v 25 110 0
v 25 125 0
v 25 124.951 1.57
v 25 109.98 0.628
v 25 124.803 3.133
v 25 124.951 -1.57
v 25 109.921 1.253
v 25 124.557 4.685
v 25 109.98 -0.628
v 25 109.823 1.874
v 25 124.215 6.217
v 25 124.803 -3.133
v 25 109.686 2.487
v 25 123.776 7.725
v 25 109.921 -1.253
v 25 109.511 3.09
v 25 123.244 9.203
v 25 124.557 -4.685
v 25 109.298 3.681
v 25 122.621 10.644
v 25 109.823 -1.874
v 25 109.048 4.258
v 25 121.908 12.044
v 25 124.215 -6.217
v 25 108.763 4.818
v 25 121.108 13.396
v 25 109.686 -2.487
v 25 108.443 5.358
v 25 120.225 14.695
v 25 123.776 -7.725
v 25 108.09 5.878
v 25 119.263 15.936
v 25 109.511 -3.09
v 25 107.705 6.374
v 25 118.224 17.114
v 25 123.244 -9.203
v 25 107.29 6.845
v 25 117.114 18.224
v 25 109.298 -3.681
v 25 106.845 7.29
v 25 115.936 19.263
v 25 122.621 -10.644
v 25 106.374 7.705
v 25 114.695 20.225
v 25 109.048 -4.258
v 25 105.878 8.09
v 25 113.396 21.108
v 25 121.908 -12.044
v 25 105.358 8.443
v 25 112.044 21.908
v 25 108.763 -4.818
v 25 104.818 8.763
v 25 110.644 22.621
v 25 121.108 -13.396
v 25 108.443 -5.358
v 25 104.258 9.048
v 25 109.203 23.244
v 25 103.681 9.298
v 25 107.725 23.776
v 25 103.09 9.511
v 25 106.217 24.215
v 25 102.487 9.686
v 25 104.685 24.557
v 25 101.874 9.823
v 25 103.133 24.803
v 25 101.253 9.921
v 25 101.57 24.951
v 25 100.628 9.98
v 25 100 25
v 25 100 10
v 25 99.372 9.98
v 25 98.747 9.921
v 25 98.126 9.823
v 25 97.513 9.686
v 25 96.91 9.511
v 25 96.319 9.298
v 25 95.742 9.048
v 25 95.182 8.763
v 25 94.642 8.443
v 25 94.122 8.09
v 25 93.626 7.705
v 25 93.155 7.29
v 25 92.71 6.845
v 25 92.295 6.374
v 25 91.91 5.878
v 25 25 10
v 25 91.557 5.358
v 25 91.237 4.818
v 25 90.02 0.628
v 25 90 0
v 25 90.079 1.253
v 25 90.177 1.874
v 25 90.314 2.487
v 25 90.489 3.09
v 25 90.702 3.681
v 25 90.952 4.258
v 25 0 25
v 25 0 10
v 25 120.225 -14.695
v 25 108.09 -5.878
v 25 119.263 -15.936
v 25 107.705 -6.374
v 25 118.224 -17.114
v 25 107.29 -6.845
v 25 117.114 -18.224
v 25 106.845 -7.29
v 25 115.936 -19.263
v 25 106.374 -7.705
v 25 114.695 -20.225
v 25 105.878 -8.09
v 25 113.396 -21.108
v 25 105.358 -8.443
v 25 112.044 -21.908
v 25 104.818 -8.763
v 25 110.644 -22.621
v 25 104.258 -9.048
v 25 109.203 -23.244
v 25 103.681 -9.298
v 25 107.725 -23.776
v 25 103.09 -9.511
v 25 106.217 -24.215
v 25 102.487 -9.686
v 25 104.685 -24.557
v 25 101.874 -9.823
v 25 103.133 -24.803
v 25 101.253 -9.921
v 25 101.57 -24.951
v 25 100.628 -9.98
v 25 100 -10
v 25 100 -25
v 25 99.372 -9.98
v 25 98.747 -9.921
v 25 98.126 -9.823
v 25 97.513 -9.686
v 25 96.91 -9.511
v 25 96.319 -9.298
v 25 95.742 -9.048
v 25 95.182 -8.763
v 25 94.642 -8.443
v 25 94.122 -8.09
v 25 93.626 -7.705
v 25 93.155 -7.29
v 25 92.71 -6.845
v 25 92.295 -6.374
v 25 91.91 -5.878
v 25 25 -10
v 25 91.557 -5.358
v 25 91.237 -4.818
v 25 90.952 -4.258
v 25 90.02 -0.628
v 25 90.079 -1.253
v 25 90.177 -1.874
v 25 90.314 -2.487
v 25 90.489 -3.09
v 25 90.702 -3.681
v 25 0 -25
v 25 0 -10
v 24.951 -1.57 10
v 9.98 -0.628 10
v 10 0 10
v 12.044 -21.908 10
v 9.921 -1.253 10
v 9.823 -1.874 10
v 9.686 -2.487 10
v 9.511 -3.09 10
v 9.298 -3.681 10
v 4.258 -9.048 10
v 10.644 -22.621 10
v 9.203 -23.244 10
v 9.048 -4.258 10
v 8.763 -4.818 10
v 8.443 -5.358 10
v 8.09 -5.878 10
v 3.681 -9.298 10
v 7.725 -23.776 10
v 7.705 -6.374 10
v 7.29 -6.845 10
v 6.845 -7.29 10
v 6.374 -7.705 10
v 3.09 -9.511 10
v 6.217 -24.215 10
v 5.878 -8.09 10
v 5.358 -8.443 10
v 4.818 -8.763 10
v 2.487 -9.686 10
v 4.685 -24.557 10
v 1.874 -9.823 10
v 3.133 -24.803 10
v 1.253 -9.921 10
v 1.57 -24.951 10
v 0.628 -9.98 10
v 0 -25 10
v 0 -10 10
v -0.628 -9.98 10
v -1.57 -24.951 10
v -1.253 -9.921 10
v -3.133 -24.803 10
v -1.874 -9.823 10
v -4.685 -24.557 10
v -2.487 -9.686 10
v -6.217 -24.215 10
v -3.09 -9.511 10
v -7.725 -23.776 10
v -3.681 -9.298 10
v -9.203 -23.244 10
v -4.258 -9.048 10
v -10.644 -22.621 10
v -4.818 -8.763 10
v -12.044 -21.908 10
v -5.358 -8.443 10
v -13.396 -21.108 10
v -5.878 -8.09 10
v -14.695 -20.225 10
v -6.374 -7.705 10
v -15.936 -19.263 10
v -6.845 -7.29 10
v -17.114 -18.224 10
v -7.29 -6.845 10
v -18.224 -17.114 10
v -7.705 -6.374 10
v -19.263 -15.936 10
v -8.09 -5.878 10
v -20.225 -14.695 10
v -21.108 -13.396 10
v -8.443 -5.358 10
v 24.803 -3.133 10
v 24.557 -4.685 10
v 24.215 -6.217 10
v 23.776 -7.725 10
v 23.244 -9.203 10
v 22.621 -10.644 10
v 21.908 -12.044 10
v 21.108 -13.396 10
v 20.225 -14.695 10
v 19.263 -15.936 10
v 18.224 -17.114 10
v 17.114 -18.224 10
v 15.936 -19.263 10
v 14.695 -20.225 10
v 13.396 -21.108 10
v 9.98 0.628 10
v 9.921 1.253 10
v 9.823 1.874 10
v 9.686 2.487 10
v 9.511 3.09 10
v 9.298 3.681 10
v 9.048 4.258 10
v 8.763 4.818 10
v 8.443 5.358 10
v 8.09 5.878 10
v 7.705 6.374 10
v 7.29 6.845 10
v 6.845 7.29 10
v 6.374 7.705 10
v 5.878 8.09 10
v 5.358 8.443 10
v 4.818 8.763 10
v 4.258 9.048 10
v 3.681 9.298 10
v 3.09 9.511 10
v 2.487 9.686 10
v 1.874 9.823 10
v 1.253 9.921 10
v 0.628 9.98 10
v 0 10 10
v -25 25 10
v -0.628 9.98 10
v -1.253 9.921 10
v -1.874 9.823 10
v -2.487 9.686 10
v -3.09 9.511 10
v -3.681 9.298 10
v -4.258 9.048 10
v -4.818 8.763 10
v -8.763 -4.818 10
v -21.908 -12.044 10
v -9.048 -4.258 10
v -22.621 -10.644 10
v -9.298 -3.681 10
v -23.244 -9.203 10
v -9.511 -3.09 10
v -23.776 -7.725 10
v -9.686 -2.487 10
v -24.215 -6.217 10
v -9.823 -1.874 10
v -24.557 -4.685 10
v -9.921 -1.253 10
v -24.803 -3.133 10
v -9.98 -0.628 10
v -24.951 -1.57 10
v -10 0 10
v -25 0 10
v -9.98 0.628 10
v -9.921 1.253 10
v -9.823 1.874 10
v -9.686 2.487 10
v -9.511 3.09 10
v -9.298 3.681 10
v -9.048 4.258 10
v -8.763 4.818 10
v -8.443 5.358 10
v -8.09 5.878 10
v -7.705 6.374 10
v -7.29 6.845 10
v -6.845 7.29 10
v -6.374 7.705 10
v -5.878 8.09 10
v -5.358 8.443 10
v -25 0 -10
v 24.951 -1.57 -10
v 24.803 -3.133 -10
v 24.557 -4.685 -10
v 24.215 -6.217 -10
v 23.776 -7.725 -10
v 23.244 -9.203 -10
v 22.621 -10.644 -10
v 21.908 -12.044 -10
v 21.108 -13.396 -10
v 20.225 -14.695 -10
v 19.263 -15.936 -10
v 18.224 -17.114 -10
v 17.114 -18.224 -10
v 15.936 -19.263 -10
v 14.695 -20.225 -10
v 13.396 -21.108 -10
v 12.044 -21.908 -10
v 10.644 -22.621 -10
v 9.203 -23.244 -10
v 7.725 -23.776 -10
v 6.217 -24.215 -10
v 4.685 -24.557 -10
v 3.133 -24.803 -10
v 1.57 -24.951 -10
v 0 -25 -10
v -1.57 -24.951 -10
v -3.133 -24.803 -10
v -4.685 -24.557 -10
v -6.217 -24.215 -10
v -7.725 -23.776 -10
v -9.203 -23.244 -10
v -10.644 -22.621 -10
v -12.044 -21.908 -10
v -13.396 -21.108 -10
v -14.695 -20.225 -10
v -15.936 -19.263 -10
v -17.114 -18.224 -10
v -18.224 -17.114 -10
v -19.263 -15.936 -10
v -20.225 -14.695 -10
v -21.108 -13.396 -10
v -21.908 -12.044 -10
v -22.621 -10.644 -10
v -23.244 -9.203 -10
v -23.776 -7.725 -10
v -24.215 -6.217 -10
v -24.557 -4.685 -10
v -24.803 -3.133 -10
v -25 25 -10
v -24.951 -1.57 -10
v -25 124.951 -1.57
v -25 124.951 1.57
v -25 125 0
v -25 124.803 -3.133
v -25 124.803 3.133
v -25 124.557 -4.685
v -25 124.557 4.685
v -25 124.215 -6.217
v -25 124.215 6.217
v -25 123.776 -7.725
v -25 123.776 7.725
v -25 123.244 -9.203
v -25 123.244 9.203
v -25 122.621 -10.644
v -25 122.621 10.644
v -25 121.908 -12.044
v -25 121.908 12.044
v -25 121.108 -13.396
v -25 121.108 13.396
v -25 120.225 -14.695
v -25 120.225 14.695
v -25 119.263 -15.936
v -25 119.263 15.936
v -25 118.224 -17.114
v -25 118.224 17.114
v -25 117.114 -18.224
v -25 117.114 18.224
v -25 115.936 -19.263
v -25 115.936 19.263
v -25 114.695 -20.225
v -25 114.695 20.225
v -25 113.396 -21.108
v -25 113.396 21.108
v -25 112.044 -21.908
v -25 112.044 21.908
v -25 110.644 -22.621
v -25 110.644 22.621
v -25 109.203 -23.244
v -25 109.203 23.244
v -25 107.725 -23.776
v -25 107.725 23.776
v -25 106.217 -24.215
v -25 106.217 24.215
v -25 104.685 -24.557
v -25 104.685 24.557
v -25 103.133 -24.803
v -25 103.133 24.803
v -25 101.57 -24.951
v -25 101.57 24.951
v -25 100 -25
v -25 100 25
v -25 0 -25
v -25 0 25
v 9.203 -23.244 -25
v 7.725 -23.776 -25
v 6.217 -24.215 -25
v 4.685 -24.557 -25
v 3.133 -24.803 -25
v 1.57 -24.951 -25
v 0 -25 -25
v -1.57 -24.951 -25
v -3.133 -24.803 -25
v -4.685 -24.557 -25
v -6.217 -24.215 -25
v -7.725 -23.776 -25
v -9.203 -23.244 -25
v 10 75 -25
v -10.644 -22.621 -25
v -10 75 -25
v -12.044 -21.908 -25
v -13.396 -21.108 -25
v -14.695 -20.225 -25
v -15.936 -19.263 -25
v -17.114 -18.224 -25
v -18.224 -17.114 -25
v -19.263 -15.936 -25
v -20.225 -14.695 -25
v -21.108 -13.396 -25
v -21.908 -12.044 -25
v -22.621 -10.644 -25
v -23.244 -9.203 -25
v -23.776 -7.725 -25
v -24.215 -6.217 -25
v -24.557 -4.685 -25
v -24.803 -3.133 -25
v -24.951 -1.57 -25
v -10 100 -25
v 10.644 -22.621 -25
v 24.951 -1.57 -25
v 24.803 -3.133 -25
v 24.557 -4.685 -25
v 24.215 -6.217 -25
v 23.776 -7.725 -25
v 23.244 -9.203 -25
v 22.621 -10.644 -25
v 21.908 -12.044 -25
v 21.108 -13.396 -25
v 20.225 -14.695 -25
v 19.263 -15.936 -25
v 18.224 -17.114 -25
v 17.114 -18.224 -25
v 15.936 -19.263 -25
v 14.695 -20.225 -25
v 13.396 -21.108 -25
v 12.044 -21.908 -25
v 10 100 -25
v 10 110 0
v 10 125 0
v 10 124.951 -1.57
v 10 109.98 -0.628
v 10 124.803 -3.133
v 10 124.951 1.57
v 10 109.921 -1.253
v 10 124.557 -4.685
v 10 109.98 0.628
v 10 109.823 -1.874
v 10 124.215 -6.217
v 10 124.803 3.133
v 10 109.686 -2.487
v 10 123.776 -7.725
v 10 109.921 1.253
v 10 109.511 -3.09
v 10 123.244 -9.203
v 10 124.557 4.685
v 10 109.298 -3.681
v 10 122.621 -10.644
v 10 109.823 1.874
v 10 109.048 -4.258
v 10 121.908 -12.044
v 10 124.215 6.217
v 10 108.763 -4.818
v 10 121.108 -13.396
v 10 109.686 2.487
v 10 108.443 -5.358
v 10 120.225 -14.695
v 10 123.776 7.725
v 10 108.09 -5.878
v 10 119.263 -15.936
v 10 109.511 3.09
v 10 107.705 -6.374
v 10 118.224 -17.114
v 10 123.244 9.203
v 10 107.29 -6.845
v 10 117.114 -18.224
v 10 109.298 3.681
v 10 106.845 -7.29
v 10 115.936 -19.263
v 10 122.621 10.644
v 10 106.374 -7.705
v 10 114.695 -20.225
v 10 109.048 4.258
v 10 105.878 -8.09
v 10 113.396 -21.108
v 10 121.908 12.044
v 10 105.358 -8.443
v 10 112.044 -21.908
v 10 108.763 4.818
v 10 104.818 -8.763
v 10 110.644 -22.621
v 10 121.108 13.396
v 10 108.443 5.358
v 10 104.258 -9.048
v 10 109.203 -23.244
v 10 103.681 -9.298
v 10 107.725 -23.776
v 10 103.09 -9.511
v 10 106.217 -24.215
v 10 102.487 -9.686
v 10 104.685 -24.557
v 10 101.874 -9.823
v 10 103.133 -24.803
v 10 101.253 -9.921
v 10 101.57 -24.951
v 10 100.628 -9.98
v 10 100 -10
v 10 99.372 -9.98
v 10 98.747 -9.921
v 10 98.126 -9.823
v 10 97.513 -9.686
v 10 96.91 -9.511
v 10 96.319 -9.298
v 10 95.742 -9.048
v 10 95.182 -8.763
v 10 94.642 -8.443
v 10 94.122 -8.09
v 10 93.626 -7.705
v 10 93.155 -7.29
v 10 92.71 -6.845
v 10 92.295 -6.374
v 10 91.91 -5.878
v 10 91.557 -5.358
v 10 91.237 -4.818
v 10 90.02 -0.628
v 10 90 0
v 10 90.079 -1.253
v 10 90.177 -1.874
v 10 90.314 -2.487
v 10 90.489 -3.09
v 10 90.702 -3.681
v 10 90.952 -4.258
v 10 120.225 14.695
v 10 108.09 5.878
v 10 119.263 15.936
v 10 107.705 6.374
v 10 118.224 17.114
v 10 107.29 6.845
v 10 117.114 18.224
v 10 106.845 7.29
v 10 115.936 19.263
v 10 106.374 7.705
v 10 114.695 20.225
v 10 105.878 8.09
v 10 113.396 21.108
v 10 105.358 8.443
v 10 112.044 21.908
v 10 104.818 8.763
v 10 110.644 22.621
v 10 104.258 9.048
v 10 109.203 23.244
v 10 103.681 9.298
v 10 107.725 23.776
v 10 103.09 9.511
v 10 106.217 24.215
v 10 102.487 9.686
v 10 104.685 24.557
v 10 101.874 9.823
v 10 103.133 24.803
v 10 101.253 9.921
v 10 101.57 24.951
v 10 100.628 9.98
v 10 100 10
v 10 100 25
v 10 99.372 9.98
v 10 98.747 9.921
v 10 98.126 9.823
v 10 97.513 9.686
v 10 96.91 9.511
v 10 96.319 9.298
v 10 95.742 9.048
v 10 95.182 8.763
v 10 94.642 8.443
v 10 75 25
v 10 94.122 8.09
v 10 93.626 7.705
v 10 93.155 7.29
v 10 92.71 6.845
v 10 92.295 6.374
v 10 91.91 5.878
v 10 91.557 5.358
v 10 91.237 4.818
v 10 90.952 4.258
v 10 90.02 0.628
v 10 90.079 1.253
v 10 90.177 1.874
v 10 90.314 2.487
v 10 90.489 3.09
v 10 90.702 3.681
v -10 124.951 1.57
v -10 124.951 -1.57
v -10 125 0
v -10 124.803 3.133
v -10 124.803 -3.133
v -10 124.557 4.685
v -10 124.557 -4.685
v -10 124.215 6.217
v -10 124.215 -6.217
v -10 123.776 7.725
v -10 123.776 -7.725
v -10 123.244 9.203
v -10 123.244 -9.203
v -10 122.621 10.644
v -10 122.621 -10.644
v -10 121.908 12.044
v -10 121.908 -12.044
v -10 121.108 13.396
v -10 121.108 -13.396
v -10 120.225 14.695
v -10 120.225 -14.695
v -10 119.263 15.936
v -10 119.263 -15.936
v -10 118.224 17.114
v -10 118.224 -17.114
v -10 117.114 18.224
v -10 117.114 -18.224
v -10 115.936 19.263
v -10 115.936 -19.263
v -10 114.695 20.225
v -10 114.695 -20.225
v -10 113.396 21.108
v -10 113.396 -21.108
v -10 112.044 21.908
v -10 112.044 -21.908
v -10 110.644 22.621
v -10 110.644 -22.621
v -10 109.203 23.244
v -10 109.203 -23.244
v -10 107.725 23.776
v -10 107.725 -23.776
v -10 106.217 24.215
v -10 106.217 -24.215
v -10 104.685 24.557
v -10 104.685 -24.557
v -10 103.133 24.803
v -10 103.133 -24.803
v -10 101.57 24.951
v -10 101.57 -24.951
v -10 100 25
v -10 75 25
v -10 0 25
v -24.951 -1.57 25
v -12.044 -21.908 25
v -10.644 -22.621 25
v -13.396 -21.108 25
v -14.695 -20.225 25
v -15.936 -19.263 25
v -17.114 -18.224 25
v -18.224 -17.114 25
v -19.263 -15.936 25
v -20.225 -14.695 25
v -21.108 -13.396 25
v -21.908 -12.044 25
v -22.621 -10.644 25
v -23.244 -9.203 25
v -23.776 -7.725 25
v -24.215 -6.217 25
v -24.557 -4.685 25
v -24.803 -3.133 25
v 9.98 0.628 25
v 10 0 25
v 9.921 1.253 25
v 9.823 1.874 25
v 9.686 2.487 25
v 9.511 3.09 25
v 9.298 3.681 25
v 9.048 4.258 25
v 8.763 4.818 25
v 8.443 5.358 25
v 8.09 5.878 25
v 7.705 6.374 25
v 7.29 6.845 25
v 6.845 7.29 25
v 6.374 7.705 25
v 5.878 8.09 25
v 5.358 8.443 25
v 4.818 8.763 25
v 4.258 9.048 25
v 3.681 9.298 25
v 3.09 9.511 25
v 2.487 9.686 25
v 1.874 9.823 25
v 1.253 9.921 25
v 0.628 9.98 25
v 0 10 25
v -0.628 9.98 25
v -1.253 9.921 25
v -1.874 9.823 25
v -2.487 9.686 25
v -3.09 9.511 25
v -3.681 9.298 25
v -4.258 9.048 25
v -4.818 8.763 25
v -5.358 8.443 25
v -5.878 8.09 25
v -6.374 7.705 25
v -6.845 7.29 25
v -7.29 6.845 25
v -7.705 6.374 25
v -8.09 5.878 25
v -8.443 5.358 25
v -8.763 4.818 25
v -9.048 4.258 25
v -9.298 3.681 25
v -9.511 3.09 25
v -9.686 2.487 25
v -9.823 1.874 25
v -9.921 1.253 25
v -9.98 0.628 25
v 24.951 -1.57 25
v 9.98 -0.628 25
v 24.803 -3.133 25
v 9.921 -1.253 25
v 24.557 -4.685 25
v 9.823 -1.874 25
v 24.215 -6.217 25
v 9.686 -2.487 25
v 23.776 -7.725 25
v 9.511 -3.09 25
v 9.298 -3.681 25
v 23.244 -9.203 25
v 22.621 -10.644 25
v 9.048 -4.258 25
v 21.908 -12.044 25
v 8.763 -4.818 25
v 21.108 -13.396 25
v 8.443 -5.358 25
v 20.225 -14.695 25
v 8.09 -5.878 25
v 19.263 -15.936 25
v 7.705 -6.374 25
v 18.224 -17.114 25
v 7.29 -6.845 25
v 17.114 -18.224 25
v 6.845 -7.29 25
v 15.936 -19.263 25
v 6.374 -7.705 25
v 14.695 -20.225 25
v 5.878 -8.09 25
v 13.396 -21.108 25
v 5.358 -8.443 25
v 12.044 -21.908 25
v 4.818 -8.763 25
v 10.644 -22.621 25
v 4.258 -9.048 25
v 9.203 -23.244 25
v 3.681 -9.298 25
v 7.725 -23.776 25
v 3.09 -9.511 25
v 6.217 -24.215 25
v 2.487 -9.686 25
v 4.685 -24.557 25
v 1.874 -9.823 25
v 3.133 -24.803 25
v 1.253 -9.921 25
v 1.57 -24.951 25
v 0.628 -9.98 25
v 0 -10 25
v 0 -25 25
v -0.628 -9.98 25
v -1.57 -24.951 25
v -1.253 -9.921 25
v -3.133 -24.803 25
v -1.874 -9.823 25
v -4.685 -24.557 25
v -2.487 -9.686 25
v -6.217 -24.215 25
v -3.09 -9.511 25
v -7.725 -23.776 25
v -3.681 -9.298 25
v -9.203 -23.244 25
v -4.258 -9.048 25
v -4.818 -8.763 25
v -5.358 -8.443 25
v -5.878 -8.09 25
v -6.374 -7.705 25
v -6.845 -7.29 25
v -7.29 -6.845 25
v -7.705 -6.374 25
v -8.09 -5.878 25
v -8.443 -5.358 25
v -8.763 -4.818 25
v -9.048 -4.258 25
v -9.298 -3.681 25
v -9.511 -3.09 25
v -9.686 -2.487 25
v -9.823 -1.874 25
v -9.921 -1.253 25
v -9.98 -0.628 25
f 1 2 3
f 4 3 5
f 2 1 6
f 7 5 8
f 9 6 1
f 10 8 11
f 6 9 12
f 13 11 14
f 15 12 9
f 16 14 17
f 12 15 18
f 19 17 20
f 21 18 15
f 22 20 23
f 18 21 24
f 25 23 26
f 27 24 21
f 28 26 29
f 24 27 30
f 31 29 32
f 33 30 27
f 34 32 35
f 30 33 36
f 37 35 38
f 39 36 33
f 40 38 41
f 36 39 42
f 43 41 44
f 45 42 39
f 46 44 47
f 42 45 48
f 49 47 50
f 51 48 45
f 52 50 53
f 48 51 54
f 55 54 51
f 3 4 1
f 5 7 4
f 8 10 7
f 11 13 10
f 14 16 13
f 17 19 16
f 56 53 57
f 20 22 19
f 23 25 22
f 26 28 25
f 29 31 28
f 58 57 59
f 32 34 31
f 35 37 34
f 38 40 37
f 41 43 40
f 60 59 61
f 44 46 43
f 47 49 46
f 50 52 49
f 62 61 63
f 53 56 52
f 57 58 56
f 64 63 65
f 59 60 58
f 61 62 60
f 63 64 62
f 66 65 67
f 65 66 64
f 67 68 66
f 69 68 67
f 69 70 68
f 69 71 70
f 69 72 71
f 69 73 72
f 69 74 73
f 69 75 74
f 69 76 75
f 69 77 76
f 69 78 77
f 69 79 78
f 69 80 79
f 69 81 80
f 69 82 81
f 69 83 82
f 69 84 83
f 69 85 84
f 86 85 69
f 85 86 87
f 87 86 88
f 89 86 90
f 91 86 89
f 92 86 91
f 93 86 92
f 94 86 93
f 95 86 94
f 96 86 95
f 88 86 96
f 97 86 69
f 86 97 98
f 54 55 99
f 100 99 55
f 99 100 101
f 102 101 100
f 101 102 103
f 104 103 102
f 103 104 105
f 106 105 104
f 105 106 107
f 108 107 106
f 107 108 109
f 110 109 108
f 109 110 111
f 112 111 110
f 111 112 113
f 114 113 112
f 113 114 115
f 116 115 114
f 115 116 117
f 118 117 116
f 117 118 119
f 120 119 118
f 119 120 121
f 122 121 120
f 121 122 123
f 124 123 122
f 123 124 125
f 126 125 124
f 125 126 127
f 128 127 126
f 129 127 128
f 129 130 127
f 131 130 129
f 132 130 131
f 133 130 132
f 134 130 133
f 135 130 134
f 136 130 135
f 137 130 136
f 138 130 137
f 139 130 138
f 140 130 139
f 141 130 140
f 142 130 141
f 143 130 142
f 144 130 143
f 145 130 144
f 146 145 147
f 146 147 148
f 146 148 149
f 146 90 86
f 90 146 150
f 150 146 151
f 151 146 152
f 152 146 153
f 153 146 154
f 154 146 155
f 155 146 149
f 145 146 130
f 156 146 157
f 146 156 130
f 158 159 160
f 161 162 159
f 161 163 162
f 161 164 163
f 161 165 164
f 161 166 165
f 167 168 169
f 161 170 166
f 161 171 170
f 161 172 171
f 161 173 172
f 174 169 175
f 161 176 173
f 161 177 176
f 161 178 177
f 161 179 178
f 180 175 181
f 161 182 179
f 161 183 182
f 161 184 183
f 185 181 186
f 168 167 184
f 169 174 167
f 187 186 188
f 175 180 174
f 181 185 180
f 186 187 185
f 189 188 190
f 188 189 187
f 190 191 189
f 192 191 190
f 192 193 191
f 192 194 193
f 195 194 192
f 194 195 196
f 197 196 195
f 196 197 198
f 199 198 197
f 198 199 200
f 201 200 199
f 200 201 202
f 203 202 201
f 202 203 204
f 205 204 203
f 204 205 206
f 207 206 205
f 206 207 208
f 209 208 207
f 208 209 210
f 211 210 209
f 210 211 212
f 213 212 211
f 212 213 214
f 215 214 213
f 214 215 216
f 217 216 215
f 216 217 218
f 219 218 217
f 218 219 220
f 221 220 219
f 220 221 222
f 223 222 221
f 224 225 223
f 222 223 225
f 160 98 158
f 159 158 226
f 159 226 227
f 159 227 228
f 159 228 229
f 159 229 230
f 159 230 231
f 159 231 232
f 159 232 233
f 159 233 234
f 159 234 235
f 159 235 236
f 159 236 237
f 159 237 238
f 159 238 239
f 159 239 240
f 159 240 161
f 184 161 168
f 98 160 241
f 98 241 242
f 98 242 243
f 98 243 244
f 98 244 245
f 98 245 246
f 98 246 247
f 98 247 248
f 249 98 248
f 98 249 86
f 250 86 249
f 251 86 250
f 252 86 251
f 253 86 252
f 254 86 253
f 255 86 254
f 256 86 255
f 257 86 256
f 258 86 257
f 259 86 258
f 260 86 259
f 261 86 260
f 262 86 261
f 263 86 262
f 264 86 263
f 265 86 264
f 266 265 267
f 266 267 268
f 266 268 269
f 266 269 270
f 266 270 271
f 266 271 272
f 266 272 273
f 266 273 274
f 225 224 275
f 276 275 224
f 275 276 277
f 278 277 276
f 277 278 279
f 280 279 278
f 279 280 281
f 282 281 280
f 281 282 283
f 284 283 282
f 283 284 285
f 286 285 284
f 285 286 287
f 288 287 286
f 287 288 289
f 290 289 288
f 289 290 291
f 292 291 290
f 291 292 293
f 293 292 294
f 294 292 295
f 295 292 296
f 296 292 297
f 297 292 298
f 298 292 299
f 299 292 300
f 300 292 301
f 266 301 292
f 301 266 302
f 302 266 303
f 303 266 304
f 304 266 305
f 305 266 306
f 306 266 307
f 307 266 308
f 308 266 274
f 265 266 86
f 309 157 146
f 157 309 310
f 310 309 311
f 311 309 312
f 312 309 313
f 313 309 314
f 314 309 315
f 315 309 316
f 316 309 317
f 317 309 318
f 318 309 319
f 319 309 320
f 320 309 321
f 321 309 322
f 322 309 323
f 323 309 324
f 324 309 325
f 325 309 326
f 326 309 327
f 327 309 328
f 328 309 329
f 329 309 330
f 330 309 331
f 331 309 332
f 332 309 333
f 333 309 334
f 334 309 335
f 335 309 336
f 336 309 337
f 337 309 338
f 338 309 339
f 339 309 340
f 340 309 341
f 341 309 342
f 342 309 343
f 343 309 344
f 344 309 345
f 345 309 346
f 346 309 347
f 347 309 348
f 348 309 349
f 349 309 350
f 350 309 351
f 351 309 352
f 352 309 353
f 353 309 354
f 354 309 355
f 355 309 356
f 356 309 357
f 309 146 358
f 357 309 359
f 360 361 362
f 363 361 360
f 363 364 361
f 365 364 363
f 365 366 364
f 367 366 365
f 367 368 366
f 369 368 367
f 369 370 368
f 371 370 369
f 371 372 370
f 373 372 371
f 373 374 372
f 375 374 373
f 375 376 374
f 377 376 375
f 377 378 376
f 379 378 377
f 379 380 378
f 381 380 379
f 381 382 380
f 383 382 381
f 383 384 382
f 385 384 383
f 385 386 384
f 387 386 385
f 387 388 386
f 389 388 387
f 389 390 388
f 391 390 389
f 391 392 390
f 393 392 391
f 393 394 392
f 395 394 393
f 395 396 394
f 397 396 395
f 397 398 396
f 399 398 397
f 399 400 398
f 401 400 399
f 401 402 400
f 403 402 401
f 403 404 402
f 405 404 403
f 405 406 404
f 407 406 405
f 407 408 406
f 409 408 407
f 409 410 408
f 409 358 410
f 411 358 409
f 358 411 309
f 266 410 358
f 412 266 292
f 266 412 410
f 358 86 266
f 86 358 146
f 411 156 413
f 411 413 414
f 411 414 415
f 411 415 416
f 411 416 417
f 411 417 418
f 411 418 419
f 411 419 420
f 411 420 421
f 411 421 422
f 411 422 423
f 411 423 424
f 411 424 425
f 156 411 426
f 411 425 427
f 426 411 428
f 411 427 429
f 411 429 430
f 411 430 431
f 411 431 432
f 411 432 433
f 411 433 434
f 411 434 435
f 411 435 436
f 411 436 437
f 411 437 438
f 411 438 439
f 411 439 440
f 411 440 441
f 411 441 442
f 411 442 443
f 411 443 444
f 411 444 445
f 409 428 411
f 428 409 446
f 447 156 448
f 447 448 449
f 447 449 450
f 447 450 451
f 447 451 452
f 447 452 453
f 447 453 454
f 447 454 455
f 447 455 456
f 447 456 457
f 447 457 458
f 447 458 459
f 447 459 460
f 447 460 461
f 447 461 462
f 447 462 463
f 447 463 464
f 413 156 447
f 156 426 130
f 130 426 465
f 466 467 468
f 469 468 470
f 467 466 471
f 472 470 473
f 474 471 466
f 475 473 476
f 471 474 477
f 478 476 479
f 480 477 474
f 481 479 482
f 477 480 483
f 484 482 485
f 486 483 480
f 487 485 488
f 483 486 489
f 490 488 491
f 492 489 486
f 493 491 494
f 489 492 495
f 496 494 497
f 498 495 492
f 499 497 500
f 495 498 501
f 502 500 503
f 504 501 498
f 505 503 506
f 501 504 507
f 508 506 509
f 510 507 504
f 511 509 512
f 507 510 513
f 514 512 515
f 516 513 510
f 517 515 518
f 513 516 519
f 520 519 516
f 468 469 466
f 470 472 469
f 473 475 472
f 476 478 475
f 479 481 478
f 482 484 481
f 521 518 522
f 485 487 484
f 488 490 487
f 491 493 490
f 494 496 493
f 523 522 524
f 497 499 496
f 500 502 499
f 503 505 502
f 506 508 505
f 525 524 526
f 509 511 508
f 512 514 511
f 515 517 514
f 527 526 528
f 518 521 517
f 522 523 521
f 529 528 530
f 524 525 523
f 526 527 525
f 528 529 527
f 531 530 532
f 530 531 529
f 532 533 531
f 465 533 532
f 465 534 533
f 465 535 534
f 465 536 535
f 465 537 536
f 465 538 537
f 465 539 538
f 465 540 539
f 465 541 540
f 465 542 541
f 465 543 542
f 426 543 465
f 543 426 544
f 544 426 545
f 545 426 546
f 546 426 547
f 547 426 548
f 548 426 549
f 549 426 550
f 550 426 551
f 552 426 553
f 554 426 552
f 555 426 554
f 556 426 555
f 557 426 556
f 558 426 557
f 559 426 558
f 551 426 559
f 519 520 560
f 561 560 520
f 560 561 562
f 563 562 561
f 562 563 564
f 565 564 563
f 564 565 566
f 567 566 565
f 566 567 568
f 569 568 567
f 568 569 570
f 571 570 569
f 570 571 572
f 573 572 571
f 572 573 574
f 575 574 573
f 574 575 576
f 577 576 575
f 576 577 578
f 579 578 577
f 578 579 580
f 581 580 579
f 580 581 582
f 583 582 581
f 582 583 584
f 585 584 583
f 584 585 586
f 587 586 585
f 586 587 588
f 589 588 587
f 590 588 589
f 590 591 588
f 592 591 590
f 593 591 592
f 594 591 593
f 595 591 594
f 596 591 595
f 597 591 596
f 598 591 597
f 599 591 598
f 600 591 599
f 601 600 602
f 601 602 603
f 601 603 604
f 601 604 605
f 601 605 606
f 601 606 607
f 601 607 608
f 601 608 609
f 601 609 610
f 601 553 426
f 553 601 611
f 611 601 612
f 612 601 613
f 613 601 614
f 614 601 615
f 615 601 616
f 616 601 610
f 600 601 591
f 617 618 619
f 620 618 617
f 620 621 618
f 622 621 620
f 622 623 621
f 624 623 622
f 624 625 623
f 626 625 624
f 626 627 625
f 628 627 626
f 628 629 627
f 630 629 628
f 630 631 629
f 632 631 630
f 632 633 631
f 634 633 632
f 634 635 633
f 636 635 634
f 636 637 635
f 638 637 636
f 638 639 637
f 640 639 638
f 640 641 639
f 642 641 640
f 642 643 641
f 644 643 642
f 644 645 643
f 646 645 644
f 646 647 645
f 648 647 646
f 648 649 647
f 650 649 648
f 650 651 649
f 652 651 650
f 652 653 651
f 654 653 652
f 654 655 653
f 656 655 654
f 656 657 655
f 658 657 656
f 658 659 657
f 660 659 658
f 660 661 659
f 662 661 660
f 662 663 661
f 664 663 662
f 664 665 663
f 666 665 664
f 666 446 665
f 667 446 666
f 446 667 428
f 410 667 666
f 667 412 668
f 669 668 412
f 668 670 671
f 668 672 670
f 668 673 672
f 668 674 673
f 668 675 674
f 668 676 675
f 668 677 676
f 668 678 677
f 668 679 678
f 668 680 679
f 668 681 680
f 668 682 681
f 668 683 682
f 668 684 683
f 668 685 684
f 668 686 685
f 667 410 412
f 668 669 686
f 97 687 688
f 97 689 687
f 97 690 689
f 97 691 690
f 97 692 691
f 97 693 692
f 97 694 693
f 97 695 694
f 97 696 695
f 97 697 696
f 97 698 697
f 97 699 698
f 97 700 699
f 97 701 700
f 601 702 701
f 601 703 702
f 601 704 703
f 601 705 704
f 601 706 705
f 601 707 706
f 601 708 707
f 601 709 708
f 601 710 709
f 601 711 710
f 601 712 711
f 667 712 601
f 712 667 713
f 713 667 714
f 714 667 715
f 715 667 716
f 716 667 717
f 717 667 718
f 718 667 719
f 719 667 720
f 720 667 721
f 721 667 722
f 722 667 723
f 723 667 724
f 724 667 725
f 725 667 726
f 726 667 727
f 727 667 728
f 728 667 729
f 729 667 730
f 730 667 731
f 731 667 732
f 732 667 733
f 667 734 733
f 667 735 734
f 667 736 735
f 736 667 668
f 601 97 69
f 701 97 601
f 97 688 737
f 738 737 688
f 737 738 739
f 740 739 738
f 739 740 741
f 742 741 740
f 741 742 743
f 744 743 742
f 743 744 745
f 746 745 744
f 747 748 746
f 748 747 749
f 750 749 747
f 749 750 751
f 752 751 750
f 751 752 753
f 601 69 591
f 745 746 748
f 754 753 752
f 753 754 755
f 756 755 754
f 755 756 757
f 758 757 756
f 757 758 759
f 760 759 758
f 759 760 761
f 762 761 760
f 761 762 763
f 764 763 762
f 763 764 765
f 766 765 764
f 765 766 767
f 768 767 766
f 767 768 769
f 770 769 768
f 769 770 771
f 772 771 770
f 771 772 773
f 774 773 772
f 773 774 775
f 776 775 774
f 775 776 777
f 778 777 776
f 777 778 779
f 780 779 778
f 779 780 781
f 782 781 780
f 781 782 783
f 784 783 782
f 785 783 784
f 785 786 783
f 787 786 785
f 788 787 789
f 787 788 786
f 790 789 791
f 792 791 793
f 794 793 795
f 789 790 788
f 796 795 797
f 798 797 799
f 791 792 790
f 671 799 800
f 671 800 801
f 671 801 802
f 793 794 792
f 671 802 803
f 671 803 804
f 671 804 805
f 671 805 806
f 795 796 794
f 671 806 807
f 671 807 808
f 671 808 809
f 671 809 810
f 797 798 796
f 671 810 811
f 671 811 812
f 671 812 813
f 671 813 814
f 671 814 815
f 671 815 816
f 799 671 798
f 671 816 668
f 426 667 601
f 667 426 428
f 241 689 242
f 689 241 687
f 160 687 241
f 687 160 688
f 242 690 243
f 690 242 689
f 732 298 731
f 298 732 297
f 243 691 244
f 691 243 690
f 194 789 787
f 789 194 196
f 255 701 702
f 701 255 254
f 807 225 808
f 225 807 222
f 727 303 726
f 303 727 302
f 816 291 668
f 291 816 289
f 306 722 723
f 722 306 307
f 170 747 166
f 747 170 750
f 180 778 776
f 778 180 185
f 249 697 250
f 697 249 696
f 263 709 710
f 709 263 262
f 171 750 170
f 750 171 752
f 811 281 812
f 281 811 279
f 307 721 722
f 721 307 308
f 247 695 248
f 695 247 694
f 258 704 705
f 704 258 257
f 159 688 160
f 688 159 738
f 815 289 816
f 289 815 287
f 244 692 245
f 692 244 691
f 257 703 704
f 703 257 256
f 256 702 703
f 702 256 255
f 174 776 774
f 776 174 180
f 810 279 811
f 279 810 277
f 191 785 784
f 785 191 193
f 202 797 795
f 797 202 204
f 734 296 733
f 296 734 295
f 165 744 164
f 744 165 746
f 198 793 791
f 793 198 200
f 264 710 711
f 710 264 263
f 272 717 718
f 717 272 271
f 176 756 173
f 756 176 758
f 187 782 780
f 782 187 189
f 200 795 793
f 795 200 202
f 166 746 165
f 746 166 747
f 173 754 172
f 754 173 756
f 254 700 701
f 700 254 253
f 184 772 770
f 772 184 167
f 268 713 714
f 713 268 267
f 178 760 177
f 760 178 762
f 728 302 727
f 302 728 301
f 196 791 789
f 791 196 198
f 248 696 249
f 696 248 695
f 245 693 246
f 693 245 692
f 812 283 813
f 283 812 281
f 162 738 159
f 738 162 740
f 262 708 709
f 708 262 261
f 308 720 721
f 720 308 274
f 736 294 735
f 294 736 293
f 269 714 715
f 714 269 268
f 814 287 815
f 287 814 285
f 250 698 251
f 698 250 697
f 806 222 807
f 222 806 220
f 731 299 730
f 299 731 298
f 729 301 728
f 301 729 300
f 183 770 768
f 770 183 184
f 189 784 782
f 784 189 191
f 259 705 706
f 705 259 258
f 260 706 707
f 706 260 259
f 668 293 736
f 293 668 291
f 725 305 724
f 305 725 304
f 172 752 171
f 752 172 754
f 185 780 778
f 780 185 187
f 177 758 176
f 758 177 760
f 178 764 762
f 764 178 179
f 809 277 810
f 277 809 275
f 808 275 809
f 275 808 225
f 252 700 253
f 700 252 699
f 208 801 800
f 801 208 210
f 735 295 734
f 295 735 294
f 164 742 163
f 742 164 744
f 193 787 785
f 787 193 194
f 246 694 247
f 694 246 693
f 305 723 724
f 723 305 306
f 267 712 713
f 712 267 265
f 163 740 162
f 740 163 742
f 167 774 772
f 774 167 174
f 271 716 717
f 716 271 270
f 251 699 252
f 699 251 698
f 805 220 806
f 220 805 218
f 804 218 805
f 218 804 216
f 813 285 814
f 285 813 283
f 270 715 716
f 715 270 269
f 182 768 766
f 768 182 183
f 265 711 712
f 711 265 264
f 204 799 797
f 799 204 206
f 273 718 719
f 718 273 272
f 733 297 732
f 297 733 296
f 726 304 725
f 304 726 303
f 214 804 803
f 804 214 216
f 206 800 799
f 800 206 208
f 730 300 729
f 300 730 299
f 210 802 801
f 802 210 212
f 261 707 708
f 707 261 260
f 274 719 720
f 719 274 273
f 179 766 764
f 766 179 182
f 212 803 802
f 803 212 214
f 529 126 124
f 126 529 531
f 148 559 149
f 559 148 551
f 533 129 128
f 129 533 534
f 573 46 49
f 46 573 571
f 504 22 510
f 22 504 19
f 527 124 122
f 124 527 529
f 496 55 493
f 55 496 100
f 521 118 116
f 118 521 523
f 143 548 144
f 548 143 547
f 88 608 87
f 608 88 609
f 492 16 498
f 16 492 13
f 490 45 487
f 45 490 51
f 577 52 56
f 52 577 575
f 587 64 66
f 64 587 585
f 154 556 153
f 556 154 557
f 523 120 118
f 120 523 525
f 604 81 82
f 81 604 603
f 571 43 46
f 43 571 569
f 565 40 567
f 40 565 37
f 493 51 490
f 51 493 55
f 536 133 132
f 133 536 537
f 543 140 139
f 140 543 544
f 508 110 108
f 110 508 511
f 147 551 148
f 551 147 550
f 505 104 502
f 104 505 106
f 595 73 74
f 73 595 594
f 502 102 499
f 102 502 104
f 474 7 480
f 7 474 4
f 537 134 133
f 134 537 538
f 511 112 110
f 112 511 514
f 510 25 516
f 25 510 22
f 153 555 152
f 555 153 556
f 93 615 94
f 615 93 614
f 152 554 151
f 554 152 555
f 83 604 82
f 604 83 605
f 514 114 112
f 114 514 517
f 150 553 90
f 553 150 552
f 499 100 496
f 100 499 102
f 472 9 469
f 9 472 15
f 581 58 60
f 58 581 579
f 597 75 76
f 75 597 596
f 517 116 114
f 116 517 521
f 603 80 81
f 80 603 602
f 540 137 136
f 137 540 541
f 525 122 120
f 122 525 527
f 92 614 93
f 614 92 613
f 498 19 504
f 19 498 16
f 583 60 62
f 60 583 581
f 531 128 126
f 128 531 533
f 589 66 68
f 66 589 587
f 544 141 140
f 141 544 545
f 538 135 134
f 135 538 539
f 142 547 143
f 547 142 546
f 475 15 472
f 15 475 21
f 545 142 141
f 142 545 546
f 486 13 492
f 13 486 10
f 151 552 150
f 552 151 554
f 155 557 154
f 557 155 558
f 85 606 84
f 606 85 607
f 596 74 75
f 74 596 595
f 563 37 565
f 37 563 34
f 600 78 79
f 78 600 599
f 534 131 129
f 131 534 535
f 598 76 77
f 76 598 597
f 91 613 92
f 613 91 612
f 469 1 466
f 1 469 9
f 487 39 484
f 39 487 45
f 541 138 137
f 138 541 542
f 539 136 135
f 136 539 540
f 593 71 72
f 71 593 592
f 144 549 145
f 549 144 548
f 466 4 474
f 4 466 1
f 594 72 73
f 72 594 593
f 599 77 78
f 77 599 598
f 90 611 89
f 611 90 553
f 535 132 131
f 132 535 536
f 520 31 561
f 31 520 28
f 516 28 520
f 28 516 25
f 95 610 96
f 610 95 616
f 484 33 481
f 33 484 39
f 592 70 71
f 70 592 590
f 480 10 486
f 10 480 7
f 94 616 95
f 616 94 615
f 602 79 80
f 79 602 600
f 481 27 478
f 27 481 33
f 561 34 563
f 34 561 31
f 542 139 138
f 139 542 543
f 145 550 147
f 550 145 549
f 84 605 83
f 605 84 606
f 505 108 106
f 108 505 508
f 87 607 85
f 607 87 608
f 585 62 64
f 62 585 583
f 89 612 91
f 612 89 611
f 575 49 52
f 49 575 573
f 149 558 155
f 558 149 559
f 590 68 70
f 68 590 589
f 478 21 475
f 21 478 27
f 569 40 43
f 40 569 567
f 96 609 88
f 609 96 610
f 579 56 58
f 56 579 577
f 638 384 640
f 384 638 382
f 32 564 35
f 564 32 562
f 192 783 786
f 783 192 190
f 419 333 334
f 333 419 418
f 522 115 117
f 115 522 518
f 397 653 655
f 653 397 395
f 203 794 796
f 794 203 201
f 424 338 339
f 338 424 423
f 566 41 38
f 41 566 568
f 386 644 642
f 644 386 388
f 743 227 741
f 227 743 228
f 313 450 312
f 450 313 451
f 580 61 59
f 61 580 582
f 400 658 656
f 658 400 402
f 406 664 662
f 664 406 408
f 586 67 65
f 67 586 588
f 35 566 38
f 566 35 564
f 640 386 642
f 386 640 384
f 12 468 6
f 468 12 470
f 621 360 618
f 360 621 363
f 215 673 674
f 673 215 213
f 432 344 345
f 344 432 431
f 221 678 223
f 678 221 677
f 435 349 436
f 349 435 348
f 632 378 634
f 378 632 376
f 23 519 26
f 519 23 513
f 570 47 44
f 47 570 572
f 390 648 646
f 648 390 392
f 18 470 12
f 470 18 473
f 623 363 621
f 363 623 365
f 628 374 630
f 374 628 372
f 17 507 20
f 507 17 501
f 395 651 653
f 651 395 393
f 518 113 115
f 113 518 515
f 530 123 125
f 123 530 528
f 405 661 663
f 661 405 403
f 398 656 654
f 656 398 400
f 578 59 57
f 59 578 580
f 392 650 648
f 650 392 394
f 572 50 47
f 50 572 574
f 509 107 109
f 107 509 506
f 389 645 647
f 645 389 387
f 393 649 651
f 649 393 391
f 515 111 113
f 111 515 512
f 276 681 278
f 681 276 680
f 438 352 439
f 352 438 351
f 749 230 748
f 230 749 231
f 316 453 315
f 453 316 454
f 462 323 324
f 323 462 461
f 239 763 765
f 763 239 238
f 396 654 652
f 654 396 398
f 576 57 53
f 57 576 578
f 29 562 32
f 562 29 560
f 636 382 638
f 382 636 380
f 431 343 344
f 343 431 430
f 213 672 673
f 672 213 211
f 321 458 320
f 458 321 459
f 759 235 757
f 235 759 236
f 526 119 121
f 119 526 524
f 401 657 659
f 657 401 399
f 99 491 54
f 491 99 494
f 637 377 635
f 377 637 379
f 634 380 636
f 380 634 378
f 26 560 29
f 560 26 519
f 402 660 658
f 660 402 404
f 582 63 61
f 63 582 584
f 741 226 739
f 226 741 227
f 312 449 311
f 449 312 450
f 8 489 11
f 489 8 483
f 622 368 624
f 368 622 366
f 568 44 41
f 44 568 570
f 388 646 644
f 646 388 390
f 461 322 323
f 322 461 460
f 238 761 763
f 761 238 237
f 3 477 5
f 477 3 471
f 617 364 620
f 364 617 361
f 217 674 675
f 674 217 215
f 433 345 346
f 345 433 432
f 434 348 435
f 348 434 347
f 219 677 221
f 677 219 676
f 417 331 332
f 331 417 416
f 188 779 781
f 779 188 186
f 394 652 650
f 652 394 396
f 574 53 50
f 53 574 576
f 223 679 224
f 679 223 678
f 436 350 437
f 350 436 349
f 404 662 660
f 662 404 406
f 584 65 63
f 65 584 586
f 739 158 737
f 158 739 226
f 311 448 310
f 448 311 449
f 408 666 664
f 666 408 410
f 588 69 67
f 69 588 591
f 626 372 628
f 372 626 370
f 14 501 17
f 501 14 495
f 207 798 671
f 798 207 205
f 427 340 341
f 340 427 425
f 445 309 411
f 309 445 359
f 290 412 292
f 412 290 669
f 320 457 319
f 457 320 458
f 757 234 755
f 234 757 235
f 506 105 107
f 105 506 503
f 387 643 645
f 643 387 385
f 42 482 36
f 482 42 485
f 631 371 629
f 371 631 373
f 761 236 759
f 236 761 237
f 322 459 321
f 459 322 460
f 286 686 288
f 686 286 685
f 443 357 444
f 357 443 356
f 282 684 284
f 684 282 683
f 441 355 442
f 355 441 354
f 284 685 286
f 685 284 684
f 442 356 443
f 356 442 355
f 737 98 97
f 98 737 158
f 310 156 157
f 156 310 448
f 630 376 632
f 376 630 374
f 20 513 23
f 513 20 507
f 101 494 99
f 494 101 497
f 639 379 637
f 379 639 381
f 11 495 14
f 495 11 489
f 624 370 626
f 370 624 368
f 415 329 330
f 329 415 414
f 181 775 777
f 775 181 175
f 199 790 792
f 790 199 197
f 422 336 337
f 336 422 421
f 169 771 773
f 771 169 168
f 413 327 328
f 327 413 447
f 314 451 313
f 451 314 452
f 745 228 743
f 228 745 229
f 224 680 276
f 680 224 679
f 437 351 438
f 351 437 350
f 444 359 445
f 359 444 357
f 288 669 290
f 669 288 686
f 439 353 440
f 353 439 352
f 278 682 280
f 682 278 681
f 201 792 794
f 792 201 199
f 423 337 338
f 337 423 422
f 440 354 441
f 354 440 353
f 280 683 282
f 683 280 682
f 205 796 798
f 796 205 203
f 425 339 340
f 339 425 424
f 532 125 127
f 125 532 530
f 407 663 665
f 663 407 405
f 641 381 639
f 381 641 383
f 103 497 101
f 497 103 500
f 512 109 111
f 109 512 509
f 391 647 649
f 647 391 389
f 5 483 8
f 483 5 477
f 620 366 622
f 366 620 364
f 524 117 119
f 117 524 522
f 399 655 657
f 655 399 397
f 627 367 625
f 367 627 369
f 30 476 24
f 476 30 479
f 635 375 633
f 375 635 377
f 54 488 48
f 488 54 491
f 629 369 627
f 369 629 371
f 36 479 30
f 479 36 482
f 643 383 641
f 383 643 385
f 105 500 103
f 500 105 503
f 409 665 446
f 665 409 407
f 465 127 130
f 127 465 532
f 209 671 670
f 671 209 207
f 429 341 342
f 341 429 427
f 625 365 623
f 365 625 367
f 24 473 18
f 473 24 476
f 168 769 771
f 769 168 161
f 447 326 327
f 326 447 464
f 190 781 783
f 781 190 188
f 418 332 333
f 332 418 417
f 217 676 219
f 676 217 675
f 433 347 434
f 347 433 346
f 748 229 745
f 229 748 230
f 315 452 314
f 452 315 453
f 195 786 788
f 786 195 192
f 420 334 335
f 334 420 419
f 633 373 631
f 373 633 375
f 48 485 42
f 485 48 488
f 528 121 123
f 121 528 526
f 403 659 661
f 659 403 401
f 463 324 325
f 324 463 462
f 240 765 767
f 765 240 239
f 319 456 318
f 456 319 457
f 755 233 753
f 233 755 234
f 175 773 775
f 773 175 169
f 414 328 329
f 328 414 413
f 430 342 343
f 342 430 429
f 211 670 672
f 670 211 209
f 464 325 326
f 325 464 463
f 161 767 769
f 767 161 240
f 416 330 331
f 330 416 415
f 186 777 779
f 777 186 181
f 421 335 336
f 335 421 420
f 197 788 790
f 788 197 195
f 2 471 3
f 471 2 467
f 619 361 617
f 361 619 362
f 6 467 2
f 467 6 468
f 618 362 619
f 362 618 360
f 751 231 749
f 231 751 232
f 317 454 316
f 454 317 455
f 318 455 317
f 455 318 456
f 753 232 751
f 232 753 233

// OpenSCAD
// file: lib.scad
module pair(split,rot=0){
     rotate([0,0,rot]){
	  translate([split/2,0,0]){
	       children();}
	  translate([-split/2,0,0]){
	       rotate([0,0,180]){
		    children();}}}}

module set(count,r){
     for(i=[0:count]){
	  rotate([0,0,360/count*i]){
	       translate([r,0,0]){
		    children();}}}}

module up(distance){
     translate([0,0,distance]){
	  children();}}

module arch(radius,height,thickness){
     cylinder(r=radius,h=thickness);
     translate([0,-radius,0]){
	  cube([height-radius,2*radius,thickness]);}}
// main file
$fn=100;
mm=1; // define units
degrees=1;

use <lib.scad>;

module example_103(){
     inter_cylinder_distance=100*mm;
     side_length=50*mm;
     module both_sides(){
	  children();
	  translate([0,inter_cylinder_distance,0]){
		    rotate([0,90,0]){
			 children();}}}
     module shell(){
	  hull(){
	       both_sides(){
		    cylinder(r=side_length/2,h=side_length,center=true);}}}
     module slots(){
	  slot_height=20*mm;
	  both_sides(){
	       cube([side_length,side_length,slot_height],center=true);}
     }
     module pins(){
	  pin_radius=10*mm;
	  both_sides(){
	       cylinder(r=pin_radius,h=inter_cylinder_distance);}}
     difference(){
	  shell();
	  slots();
	  pins();}
}

example_103();
